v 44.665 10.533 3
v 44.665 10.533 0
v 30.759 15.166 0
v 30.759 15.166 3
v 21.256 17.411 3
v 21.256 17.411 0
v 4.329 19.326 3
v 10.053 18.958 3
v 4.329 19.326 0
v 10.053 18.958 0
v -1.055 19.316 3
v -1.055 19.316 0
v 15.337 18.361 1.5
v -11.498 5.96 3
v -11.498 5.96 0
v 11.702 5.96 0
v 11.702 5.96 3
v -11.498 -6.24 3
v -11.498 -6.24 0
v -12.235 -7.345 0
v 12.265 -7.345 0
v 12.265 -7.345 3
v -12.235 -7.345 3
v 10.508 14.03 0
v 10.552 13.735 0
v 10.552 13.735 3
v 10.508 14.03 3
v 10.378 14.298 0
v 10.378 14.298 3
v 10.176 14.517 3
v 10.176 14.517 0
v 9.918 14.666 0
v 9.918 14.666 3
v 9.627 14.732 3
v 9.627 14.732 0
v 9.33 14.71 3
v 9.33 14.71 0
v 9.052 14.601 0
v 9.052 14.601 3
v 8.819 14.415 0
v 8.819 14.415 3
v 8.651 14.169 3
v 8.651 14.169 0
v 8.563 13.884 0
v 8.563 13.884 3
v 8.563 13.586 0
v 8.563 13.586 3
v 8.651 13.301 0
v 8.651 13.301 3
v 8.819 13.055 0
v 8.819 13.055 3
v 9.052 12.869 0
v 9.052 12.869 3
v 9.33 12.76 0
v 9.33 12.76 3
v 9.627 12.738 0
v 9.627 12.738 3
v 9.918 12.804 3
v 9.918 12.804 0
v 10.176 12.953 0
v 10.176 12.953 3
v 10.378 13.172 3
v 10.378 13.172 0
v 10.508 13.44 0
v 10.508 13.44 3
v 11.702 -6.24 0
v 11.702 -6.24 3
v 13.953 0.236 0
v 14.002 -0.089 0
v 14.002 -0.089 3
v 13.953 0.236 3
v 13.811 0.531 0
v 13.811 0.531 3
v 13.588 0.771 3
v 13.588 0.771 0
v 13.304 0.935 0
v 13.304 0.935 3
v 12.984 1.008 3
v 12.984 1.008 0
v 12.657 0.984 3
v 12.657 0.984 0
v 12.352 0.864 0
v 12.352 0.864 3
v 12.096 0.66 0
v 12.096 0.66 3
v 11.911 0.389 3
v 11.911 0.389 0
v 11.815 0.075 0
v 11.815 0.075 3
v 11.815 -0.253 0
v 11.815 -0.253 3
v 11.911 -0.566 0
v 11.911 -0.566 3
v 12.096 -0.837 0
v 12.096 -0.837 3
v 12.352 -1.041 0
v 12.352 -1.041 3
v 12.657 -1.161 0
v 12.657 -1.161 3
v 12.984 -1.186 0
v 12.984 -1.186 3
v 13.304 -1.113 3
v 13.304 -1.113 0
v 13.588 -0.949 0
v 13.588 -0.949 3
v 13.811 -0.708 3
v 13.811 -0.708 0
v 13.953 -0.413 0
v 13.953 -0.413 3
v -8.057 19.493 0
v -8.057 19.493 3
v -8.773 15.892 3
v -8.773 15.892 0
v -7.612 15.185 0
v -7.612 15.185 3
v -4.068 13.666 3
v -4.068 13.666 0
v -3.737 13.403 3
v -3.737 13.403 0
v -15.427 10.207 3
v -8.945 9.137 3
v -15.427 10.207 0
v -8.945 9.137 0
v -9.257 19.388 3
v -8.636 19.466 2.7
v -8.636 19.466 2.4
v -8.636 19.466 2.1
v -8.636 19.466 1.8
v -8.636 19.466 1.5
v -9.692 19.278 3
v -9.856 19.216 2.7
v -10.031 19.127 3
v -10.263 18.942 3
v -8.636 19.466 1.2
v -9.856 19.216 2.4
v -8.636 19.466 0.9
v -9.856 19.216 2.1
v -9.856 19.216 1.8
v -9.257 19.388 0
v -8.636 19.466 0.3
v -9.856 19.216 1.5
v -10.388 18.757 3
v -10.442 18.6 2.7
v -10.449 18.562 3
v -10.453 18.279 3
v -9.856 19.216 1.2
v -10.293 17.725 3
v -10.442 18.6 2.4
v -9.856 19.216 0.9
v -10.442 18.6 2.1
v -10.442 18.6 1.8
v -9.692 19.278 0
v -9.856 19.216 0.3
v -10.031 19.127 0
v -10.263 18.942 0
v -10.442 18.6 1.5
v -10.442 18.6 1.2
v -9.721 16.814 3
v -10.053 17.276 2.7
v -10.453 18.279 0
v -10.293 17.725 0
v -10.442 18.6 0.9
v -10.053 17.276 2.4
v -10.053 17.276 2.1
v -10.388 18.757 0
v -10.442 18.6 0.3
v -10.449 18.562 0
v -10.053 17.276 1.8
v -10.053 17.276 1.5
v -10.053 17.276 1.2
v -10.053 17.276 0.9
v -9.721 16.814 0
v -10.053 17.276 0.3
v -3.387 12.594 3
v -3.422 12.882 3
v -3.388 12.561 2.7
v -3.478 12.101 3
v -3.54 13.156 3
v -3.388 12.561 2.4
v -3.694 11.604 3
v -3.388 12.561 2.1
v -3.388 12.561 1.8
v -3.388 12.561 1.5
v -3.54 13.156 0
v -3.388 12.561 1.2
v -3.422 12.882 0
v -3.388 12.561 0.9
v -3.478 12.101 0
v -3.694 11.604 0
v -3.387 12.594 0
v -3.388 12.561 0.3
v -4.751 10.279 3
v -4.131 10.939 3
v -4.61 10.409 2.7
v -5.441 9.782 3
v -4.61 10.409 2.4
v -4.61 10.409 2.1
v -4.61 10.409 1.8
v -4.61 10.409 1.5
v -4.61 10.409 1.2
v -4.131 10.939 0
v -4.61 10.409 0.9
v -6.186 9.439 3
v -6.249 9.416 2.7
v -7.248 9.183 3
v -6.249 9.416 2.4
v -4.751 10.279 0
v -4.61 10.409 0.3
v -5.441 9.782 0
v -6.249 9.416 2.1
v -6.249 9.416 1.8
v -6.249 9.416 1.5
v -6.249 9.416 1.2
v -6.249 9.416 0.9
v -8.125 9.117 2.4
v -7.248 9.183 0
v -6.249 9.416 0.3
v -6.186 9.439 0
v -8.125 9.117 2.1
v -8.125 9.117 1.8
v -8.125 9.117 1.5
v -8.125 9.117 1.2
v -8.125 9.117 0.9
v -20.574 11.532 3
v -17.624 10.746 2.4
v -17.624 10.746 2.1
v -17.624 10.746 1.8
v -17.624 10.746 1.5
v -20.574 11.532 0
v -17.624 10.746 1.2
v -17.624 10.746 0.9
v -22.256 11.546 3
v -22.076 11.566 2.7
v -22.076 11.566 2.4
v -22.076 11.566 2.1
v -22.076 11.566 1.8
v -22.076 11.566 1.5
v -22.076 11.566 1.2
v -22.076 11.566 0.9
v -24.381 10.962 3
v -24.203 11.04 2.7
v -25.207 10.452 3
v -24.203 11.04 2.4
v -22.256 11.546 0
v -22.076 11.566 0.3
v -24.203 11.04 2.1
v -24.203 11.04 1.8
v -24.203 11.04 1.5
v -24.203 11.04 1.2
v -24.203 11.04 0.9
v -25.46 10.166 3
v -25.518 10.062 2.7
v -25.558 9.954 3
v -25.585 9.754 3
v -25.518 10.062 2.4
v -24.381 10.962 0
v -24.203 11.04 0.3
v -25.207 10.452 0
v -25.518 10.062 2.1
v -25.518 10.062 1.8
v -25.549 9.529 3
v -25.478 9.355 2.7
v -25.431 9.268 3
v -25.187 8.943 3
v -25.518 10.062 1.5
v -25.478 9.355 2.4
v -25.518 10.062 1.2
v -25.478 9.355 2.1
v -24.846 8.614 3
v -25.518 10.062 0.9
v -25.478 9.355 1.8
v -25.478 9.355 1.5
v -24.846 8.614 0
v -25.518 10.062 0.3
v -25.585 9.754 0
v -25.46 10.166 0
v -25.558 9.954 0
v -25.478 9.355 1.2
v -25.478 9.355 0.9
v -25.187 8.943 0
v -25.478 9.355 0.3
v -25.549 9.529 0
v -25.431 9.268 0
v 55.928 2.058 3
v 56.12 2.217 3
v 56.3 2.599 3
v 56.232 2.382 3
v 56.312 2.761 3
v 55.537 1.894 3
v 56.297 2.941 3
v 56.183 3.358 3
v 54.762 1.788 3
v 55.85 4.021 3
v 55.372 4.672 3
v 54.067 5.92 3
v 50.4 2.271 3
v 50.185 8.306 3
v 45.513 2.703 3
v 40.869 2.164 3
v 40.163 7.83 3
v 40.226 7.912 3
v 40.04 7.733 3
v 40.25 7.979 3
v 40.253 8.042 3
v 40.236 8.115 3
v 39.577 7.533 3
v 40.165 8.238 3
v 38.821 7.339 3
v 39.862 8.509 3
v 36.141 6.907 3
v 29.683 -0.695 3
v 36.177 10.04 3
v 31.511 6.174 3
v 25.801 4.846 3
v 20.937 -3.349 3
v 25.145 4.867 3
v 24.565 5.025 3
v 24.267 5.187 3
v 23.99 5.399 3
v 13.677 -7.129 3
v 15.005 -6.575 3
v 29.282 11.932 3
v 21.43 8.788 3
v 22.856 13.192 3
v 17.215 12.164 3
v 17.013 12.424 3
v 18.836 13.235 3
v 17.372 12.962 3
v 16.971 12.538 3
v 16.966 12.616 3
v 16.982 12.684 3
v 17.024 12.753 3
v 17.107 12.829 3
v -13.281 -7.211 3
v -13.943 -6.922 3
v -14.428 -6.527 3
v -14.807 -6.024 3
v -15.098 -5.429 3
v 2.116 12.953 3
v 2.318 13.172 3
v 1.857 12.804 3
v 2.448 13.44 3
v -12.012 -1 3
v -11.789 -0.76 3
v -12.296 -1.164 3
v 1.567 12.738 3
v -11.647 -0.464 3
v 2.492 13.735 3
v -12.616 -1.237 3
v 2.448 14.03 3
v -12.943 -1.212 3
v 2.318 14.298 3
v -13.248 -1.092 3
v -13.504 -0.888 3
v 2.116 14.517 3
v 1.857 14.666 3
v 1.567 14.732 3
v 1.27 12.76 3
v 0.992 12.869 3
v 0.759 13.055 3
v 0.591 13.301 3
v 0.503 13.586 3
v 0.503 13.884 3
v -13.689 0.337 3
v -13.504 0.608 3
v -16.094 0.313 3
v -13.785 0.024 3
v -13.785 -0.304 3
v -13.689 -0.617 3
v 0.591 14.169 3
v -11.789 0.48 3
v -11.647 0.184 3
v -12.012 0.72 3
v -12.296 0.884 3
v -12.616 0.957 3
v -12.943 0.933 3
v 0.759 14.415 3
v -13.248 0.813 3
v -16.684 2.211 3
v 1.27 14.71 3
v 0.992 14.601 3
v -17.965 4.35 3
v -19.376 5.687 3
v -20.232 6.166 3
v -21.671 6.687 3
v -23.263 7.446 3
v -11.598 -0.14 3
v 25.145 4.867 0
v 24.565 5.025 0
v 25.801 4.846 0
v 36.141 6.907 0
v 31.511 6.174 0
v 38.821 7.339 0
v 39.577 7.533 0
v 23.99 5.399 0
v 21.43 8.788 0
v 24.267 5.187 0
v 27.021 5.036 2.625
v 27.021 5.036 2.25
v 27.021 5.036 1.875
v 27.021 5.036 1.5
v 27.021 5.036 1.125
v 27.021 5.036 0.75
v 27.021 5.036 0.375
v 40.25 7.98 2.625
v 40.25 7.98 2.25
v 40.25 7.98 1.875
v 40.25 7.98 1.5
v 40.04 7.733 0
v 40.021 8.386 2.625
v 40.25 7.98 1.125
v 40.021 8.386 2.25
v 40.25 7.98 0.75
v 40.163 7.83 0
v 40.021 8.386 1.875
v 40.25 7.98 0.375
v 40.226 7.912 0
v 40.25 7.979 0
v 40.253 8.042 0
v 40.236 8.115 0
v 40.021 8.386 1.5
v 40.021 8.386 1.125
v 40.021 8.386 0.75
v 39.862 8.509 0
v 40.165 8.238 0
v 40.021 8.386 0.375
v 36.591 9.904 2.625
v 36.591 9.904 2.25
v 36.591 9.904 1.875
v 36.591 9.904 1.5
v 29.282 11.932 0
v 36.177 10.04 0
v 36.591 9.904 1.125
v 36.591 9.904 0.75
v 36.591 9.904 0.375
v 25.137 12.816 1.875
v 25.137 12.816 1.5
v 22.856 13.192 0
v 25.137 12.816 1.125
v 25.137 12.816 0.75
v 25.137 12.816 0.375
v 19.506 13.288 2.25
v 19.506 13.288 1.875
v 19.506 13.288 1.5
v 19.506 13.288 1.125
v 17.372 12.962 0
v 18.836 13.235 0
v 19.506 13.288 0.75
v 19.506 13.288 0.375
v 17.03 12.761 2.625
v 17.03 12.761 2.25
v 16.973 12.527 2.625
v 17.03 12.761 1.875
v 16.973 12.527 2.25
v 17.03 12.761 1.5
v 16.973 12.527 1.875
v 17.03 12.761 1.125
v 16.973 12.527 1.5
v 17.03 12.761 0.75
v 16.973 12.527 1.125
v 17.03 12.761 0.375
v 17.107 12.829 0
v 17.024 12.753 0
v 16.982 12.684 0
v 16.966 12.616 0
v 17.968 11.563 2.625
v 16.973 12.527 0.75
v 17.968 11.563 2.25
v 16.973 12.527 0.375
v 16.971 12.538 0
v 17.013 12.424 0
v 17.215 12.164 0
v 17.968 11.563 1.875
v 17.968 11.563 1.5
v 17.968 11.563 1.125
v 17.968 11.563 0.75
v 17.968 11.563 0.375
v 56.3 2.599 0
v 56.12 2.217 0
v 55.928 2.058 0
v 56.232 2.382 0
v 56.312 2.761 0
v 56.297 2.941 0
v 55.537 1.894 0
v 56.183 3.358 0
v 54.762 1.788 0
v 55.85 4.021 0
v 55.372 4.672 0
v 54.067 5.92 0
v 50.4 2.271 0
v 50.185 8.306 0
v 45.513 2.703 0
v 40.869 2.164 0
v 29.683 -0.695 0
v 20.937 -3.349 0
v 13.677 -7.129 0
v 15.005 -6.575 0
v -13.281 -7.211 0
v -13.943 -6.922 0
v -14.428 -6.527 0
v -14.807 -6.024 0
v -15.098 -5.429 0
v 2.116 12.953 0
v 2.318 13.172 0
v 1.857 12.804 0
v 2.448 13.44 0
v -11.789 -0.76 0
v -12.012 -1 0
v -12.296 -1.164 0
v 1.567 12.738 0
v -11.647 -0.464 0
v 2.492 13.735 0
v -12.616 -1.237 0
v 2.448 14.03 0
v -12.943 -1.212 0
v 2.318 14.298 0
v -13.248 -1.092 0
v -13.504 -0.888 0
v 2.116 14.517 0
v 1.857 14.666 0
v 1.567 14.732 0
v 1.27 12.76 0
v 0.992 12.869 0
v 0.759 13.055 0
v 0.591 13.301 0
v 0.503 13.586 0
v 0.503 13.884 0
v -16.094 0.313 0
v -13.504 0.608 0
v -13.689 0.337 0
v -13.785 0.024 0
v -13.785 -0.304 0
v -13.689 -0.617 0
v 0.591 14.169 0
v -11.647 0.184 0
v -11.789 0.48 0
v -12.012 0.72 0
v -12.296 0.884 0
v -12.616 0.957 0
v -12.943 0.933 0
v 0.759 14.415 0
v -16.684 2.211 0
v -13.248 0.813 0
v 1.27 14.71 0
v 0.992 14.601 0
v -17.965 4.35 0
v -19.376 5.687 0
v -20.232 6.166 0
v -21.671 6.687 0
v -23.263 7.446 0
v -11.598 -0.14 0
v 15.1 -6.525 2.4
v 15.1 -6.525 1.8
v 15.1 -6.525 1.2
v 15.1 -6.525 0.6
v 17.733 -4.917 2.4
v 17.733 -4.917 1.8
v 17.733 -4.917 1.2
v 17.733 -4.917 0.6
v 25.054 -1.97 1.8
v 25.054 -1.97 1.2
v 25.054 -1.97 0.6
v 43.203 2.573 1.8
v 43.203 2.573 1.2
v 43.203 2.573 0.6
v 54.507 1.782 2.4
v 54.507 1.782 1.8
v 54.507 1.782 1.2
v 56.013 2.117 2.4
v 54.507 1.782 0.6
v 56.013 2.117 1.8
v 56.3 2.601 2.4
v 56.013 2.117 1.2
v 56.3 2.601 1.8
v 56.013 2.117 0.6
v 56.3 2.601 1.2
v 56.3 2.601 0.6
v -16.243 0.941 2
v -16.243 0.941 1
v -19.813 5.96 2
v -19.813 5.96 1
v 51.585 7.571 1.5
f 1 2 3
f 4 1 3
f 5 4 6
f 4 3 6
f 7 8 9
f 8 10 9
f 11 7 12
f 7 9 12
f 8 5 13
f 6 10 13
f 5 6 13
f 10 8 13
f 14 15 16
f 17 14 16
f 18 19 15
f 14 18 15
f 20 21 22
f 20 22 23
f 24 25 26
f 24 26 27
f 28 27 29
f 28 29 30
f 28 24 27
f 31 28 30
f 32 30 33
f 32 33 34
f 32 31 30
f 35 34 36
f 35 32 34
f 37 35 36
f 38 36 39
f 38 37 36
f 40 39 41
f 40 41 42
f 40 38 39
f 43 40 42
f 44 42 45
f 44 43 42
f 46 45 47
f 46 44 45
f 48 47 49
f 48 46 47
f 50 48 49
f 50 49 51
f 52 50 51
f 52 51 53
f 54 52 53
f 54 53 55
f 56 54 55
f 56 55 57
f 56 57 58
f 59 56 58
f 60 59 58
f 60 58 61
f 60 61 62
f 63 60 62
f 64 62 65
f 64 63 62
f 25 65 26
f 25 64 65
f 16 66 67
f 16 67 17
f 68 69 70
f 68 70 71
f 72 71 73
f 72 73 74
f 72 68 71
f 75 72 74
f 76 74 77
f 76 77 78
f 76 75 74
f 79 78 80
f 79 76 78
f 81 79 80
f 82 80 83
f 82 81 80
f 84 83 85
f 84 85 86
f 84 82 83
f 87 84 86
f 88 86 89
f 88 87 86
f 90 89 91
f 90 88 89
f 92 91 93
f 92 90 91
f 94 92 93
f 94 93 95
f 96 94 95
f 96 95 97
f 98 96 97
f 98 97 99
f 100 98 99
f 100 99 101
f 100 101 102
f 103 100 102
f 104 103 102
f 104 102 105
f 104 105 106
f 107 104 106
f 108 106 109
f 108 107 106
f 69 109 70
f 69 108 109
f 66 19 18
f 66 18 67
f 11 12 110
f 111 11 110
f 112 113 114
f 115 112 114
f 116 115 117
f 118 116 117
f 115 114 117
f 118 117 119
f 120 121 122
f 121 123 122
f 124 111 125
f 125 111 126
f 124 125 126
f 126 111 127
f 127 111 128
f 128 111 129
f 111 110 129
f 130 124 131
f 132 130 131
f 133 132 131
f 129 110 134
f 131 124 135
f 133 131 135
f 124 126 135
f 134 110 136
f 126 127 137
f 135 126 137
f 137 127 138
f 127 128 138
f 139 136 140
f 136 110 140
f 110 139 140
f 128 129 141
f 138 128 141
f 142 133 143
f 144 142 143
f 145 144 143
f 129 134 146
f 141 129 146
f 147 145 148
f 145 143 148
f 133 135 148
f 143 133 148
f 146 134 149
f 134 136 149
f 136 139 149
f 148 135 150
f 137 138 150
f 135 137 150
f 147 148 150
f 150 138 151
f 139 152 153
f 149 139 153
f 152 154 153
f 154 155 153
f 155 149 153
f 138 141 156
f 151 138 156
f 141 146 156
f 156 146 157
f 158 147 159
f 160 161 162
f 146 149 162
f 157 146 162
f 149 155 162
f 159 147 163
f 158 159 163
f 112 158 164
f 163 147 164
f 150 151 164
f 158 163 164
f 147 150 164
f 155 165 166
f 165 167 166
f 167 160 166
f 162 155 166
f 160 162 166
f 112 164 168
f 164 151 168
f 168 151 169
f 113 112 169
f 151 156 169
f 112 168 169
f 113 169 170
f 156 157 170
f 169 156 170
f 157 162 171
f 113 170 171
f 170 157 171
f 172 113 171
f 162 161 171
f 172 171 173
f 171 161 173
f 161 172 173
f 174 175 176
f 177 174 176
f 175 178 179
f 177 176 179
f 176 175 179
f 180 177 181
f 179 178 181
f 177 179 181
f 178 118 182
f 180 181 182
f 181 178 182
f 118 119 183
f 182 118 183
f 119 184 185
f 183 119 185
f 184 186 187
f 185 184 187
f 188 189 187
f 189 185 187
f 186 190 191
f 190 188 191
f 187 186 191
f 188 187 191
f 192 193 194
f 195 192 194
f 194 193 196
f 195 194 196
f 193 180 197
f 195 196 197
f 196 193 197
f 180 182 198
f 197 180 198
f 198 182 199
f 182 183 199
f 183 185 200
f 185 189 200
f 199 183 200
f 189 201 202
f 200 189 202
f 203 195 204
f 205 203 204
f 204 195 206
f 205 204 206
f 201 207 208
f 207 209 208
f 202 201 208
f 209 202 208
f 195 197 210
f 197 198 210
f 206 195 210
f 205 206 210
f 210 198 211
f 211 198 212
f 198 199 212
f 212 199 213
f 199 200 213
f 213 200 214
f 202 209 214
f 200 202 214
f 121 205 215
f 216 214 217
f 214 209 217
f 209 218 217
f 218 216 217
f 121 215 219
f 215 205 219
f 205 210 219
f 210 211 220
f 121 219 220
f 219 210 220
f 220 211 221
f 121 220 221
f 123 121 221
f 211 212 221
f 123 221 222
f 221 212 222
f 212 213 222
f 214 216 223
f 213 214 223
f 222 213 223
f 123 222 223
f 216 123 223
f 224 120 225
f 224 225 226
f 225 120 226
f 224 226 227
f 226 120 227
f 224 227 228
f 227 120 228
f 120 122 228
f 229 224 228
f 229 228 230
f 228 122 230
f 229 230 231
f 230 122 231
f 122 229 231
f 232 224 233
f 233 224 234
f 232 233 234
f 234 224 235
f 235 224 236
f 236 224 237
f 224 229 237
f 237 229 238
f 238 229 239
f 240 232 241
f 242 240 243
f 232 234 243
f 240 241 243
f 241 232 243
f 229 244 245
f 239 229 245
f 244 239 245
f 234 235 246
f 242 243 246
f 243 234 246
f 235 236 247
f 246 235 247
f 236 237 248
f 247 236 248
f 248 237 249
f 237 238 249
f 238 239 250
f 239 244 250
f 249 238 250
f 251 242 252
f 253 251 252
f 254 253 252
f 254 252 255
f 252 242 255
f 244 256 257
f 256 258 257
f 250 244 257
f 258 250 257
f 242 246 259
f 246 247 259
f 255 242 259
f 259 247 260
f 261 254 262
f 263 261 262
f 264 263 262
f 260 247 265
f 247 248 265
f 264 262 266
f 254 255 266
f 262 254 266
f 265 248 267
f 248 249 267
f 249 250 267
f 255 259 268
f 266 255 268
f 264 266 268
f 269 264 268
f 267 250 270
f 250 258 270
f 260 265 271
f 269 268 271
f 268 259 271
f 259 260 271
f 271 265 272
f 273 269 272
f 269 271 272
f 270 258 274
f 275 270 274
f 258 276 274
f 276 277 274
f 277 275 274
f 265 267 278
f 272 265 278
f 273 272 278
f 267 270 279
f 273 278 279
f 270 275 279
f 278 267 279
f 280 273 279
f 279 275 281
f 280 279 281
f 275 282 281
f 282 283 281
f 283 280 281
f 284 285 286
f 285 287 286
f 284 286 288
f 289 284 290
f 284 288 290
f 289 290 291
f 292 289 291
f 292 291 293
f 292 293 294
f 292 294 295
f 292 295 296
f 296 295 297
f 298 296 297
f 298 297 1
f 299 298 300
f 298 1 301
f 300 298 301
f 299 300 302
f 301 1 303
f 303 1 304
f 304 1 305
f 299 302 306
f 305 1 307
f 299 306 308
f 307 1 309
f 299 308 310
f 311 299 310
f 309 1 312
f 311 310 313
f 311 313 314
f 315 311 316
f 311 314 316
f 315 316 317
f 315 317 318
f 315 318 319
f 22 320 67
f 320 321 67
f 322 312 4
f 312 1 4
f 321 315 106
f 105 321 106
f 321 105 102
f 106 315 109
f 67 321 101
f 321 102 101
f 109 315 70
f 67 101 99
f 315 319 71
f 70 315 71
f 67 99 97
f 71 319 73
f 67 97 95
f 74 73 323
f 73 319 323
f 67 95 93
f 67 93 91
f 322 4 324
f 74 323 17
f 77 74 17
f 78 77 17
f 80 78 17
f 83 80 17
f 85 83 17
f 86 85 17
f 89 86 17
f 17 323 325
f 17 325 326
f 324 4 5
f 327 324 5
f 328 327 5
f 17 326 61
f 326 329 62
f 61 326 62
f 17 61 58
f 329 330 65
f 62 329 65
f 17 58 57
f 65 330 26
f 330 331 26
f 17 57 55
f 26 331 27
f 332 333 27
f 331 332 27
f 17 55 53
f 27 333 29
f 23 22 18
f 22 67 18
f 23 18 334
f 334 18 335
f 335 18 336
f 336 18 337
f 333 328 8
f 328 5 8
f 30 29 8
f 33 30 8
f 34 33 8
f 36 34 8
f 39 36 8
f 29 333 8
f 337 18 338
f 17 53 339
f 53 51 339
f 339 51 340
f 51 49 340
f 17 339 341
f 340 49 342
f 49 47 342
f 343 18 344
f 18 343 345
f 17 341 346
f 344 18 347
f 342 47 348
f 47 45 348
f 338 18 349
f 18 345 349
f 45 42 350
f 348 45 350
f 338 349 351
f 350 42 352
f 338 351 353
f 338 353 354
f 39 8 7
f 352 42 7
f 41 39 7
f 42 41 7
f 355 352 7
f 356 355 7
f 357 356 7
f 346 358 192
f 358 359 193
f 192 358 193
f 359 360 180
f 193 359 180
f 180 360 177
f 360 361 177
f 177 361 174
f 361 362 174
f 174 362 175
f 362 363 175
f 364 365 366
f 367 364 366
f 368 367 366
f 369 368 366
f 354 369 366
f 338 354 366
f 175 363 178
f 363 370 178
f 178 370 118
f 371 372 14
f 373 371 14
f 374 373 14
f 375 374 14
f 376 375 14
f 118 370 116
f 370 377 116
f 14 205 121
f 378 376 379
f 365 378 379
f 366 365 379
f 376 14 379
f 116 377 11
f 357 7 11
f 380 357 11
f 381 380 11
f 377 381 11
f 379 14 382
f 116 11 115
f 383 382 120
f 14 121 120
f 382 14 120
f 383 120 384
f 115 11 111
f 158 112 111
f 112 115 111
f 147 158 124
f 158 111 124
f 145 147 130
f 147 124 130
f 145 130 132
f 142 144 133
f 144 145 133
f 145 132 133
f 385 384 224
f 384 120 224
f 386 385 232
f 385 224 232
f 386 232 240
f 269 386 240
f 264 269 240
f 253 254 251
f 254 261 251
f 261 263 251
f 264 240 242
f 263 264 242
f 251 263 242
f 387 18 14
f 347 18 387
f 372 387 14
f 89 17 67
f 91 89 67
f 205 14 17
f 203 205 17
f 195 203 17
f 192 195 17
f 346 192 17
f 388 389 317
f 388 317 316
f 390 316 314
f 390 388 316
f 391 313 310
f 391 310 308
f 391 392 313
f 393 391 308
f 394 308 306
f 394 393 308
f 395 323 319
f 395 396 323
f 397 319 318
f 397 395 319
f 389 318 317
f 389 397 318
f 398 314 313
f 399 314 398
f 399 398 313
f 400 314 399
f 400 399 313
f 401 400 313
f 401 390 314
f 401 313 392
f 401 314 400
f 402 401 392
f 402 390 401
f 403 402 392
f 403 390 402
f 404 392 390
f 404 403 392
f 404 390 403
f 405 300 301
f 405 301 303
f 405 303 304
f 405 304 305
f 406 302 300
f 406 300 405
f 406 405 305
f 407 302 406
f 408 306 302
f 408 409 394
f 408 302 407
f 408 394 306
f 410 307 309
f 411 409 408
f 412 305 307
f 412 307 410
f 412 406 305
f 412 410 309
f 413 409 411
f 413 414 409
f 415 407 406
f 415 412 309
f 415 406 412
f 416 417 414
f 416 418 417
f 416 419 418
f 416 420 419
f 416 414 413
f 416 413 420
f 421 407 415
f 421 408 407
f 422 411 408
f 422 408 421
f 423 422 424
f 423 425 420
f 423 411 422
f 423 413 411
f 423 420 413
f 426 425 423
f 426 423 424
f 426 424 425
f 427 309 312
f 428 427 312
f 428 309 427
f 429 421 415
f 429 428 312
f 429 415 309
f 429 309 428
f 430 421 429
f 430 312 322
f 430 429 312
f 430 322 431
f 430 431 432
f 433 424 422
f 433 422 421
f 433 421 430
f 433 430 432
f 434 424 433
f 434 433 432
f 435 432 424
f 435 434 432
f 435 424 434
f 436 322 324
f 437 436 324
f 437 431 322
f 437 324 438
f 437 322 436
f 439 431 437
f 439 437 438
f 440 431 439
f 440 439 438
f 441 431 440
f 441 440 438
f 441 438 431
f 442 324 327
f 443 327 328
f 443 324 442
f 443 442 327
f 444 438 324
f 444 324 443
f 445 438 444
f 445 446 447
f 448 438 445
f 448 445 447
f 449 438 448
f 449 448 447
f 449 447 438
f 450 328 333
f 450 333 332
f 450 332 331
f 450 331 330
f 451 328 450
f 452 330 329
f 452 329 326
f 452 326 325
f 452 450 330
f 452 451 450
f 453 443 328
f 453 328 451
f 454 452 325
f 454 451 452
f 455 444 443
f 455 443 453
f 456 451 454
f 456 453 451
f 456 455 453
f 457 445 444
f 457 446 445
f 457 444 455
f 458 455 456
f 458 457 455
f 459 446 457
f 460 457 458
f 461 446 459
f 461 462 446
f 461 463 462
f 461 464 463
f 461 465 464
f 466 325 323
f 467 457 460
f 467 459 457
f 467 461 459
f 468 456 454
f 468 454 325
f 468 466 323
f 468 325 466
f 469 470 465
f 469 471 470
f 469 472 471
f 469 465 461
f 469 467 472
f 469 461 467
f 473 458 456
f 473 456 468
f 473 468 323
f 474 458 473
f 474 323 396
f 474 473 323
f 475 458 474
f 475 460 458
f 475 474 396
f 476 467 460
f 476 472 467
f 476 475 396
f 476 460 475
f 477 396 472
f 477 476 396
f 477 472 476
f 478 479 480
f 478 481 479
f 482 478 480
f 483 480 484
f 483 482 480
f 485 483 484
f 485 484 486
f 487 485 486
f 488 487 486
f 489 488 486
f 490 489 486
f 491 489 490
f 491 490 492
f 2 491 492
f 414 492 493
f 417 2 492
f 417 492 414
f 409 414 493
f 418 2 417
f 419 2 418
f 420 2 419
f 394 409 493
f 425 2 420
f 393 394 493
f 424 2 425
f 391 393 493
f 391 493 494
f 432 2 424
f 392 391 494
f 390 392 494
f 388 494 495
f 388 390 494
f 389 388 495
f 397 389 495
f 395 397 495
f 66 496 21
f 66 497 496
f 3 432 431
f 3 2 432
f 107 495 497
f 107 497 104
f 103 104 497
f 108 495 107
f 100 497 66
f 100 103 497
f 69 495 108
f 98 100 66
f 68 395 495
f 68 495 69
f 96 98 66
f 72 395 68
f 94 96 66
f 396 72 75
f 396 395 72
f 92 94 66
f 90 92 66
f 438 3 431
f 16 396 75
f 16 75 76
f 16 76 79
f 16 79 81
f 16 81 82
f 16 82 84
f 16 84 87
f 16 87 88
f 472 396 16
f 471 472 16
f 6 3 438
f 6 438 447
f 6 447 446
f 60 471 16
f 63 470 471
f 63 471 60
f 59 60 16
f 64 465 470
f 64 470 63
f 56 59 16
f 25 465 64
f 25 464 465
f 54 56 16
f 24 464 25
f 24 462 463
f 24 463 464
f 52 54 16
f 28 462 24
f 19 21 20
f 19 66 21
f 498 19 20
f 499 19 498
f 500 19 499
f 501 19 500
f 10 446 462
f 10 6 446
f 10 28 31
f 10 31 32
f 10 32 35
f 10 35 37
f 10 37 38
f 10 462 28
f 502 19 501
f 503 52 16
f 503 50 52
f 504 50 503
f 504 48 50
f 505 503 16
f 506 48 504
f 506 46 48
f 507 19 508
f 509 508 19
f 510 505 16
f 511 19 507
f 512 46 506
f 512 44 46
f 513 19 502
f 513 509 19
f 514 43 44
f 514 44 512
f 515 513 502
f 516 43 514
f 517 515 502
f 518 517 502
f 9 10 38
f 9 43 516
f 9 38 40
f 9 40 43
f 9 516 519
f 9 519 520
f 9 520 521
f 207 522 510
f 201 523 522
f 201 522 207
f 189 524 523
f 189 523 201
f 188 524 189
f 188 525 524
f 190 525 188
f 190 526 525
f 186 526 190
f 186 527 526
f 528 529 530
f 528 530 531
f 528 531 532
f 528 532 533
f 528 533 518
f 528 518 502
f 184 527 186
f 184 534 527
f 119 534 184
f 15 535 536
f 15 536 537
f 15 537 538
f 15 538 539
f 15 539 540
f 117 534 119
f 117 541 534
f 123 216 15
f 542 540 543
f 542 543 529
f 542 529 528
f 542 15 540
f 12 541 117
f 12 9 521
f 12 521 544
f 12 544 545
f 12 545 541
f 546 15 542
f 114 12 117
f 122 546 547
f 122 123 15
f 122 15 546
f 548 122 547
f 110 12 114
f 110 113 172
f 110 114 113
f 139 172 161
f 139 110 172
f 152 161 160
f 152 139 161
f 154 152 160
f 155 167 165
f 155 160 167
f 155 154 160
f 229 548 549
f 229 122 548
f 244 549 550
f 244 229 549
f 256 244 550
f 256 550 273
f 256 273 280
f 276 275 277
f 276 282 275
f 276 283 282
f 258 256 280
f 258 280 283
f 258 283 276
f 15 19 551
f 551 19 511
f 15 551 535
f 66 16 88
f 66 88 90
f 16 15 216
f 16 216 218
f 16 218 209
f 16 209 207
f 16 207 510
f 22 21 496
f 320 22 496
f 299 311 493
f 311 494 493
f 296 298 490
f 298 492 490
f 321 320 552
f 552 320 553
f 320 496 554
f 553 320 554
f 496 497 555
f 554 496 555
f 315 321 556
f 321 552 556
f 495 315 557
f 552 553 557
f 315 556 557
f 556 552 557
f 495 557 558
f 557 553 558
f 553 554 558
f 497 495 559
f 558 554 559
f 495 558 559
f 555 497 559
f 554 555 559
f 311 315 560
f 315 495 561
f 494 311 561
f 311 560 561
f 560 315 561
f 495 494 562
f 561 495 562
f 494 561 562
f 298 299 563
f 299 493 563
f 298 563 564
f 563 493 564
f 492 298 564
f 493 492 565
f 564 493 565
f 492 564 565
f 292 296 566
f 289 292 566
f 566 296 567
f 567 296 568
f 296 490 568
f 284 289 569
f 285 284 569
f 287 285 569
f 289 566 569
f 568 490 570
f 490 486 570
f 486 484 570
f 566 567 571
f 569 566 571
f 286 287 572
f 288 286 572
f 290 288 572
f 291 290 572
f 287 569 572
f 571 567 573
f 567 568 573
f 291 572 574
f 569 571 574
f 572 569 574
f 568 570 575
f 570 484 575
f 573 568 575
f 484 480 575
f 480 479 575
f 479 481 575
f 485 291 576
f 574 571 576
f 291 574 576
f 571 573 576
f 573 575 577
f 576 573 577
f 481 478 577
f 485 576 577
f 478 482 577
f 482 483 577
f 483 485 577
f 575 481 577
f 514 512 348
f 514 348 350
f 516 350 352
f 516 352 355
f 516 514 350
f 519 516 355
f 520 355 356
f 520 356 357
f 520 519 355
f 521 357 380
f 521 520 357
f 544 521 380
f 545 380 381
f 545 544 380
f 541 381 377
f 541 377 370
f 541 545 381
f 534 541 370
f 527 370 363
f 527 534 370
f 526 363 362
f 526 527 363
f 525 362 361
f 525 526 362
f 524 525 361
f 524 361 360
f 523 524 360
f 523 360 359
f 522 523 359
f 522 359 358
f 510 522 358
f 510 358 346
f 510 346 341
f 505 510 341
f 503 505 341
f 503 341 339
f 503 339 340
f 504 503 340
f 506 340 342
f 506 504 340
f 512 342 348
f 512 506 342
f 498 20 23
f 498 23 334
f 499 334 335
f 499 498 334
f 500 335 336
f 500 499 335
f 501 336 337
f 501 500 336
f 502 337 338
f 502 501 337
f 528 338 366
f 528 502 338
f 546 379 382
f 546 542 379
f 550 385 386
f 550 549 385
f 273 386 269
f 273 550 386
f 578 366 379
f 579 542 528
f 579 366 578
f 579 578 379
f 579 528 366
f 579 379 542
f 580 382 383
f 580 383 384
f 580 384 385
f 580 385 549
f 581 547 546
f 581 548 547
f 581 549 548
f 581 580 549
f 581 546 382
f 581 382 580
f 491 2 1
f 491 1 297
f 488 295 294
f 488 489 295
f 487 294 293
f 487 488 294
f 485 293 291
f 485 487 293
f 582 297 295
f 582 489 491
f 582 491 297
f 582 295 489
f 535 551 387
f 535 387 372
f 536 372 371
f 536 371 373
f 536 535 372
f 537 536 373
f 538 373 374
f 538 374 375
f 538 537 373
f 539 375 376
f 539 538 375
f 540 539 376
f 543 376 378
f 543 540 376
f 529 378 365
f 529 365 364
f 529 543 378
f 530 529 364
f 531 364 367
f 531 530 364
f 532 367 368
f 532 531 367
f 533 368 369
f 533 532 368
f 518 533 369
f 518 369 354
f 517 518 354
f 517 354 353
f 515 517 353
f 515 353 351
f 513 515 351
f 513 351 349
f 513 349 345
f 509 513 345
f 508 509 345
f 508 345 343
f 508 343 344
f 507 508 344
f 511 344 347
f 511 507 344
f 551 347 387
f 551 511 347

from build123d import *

# Parameters (mm, degrees)
IZIM1_R                     = 1.1
IZIM1_R_2                   = 1
IZIM1_W                     = 23.2
IZIM1_H                     = 12.2
Y_KSEKLIK_EKSTR_ZYON1_DEPTH = 3


with BuildPart() as part:
    # Çizim1 → Yükseklik-Ekstrüzyon1 (new body)
    with BuildSketch(Plane.XY):
        with BuildLine():
            Line((12.26515282, -7.345335078), (-12.235337427, -7.345335078))
            add(Edge.make_bspline(
                [(-12.235337427, -7.345335078), (-16.214500835, -7.345335078), (-14.661800211, 0.558315149), (-19.745392533, 6.868903319), (-22.437333365, 6.536545954), (-24.846259501, 8.614190435)],
                knots=[0, 0, 0, 0, 0.437166451, 0.729739406, 1, 1, 1, 1], degree=3))
            add(Edge.make_bspline(
                [(-1.055175912, 19.315596615), (-1.889483108, 19.276884473), (-5.401867483, 19.347704296), (-11.833854752, 19.851977444), (-8.313684396, 14.307373826), (-2.021960961, 14.170876921), (-5.638441386, 8.313723855), (-11.649967871, 9.580252194), (-17.355435094, 10.45740022), (-21.474762223, 12.197073251), (-26.214845545, 10.406096992), (-25.426619885, 9.114738182), (-24.846259501, 8.614190435)],
                knots=[0, 0, 0, 0, 0.070362386, 0.155384077, 0.208376842, 0.311744431, 0.352432055, 0.47685756, 0.569052151, 0.643479447, 0.705243668, 0.743354082, 0.743354082, 0.743354082, 0.743354082], degree=3))
            add(Edge.make_bspline(
                [(44.664588335, 10.532889161), (34.611664046, 14.180926474), (22.947418736, 18.085696578), (3.907170347, 19.545851194), (-1.055175912, 19.315596615)],
                knots=[0, 0, 0, 0, 0.663075295, 0.975069149, 0.975069149, 0.975069149, 0.975069149], degree=3))
            add(Edge.make_bspline(
                [(44.664588335, 10.532889161), (46.498131519, 9.867527147), (51.272350898, 8.225167426), (55.595387462, 4.912246062), (56.183113274, 3.358042913)],
                knots=[0, 0, 0, 0, 0.546915446, 1, 1, 1, 1], degree=3))
            add(Edge.make_bspline(
                [(12.26515282, -7.345335078), (14.290427878, -7.345335078), (18.204063041, -4.147705218), (26.733335824, -1.307892393), (38.543515668, 1.445116949), (45.643991375, 3.615387193), (57.099133869, 0.935685302), (56.183113274, 3.358042913)],
                knots=[0, 0, 0, 0, 0.131306773, 0.304515494, 0.607289141, 0.857344902, 1, 1, 1, 1], degree=3))
        make_face()
        with Locations((-12.69778463, -0.139850503)):
            Circle(IZIM1_R, mode=Mode.SUBTRACT)
        with Locations((12.90221537, -0.088605195)):
            Circle(IZIM1_R, mode=Mode.SUBTRACT)
        with Locations((1.492135288, 13.734948306)):
            Circle(IZIM1_R_2, mode=Mode.SUBTRACT)
        with Locations((9.552198999, 13.734948306)):
            Circle(IZIM1_R_2, mode=Mode.SUBTRACT)
        with BuildLine():
            add(Edge.make_bspline(
                [(24.565189553, 5.024768451), (25.869175835, 4.455495851), (31.396557168, 6.841542194), (46.277861788, 7.295203777), (31.268526651, 11.575571902), (24.774336438, 12.906515091), (21.077918382, 13.558691292), (15.225918786, 12.810026232), (22.171923305, 9.592412062), (23.153328657, 5.641135153), (24.565189553, 5.024768451)],
                knots=[0, 0, 0, 0, 0.114686735, 0.313852211, 0.537605762, 0.626373915, 0.737466003, 0.787216229, 0.875825598, 1, 1, 1, 1], degree=3))
        make_face(mode=Mode.SUBTRACT)
        with Locations((0.10221537, -0.139850503)):
            Rectangle(IZIM1_W, IZIM1_H, mode=Mode.SUBTRACT)
    extrude(amount=Y_KSEKLIK_EKSTR_ZYON1_DEPTH)


solid = part.part
